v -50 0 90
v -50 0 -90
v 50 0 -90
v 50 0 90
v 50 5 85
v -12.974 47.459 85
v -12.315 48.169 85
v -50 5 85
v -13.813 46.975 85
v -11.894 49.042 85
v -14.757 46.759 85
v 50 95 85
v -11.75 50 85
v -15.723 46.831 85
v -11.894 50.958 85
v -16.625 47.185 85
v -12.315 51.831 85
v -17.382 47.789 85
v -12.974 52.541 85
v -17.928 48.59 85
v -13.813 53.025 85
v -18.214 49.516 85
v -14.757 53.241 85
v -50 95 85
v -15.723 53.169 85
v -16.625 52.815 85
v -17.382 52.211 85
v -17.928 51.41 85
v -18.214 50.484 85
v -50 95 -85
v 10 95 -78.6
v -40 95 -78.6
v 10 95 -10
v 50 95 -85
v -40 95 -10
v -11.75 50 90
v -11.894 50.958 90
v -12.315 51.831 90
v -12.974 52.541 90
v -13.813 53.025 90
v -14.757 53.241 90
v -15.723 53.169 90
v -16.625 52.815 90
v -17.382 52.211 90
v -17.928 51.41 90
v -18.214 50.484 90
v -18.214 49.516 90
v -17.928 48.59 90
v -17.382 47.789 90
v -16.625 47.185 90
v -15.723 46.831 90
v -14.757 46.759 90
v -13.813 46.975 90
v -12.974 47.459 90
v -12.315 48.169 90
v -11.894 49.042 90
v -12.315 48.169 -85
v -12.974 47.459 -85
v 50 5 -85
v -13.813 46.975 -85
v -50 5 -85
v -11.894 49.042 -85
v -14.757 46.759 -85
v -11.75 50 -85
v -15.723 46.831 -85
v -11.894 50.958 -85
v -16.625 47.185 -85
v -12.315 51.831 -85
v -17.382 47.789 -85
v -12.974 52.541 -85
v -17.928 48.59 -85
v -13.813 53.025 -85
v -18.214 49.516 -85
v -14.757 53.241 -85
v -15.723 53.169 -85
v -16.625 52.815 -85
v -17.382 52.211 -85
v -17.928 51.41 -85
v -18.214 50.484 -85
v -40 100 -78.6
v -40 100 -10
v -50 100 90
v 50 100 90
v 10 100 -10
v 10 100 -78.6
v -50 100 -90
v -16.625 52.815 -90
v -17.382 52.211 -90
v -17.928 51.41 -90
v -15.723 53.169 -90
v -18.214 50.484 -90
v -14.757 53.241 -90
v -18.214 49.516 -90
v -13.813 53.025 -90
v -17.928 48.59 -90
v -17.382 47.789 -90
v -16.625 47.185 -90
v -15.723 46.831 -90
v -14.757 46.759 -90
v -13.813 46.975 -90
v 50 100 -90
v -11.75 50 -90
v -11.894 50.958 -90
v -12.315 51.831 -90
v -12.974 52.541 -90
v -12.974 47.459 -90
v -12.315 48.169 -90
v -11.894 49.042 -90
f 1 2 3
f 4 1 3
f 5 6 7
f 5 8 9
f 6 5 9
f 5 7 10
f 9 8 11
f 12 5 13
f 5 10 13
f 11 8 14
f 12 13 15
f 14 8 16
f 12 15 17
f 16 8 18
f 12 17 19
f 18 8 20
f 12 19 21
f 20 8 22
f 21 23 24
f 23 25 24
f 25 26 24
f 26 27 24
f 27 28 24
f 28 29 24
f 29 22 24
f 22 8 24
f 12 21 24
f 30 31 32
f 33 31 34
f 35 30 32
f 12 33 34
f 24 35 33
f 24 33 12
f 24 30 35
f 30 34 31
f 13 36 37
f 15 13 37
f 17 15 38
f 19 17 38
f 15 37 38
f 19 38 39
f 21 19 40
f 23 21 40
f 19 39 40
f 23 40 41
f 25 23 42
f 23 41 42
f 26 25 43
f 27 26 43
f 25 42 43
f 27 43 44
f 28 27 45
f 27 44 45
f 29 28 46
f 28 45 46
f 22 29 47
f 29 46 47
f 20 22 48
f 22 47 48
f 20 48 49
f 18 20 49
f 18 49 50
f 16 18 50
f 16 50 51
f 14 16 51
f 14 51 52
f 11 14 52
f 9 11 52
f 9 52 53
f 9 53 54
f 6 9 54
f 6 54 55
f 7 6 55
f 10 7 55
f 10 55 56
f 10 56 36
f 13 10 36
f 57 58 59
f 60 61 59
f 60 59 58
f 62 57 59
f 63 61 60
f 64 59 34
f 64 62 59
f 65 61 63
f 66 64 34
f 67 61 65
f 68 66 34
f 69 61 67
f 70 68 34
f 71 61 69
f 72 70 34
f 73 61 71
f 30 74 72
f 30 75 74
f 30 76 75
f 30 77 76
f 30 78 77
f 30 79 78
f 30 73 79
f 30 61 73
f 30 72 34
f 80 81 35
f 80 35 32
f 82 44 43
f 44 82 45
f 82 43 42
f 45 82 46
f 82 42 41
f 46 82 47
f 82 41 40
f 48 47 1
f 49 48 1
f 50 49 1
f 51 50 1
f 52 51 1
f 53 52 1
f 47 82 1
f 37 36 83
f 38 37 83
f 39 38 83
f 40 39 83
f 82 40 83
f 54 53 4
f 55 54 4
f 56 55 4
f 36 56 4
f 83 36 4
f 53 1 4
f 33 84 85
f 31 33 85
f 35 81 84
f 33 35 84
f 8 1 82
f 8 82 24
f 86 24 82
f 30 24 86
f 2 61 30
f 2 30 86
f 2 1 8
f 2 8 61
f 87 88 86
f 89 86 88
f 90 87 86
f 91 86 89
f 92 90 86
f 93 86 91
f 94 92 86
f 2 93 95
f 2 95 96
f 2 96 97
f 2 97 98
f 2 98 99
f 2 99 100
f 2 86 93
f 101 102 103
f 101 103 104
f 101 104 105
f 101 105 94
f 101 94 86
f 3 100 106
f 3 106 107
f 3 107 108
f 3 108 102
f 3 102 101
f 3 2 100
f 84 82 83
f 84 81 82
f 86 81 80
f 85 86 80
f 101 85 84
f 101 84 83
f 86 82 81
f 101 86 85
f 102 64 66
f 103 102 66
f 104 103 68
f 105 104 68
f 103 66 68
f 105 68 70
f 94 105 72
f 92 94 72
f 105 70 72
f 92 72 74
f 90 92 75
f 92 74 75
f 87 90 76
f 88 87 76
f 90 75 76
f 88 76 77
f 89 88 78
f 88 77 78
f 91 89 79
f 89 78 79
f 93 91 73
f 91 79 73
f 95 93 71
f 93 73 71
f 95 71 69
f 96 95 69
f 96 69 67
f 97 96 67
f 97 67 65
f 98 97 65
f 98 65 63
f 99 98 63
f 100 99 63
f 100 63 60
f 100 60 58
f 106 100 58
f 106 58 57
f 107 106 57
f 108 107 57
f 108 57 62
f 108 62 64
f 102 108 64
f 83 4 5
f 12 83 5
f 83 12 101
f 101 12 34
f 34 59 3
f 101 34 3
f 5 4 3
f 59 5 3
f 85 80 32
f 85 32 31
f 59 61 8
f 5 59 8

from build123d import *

# Parameters (mm, degrees)
SKETCH_1_W               = 100
SKETCH_1_H               = 180
EXTRUDE_1_DEPTH          = 100
SKETCH_2_W               = 50
SKETCH_2_H               = 68.6
CUT_EXTRUDE_1_DEPTH      = 90
SKETCH_3_W               = 170
SKETCH_3_H               = 90
CUT_EXTRUDE_2_DEPTH      = 101
SKETCH_4_R               = 3.25
CUT_EXTRUDE_3_DEPTH      = 1
CUT_EXTRUDE_3_DEPTH_BACK = 181


with BuildPart() as part:
    # 草图1 → 凸台-拉伸1 (new body)
    with BuildSketch(Plane(origin=(0, 0, 0), x_dir=(1, 0, 0), z_dir=(0, 1, 0))):
        Rectangle(SKETCH_1_W, SKETCH_1_H)
    extrude(amount=EXTRUDE_1_DEPTH)

    # 草图2 → 切除-拉伸1 (cut)
    with BuildSketch(Plane(origin=(0, 100, 0), x_dir=(1, 0, 0), z_dir=(0, 1, 0))):
        with Locations((-15, 44.3)):
            Rectangle(SKETCH_2_W, SKETCH_2_H)
    extrude(amount=-CUT_EXTRUDE_1_DEPTH, mode=Mode.SUBTRACT)

    # 草图3 → 切除-拉伸2 (cut, through all)
    with BuildSketch(Plane.ZY.offset(50)):
        with Locations((0, 50)):
            Rectangle(SKETCH_3_W, SKETCH_3_H)
    extrude(amount=-CUT_EXTRUDE_2_DEPTH, mode=Mode.SUBTRACT)

    # 草图4 → 切除-拉伸3 (cut, two sides)
    with BuildSketch(Plane.XY.offset(90)) as cut_extrude_3_sk:
        with Locations((-15, 50)):
            Circle(SKETCH_4_R)
    extrude(amount=CUT_EXTRUDE_3_DEPTH, mode=Mode.SUBTRACT)
    extrude(cut_extrude_3_sk.sketch, amount=-CUT_EXTRUDE_3_DEPTH_BACK, mode=Mode.SUBTRACT)


solid = part.part
